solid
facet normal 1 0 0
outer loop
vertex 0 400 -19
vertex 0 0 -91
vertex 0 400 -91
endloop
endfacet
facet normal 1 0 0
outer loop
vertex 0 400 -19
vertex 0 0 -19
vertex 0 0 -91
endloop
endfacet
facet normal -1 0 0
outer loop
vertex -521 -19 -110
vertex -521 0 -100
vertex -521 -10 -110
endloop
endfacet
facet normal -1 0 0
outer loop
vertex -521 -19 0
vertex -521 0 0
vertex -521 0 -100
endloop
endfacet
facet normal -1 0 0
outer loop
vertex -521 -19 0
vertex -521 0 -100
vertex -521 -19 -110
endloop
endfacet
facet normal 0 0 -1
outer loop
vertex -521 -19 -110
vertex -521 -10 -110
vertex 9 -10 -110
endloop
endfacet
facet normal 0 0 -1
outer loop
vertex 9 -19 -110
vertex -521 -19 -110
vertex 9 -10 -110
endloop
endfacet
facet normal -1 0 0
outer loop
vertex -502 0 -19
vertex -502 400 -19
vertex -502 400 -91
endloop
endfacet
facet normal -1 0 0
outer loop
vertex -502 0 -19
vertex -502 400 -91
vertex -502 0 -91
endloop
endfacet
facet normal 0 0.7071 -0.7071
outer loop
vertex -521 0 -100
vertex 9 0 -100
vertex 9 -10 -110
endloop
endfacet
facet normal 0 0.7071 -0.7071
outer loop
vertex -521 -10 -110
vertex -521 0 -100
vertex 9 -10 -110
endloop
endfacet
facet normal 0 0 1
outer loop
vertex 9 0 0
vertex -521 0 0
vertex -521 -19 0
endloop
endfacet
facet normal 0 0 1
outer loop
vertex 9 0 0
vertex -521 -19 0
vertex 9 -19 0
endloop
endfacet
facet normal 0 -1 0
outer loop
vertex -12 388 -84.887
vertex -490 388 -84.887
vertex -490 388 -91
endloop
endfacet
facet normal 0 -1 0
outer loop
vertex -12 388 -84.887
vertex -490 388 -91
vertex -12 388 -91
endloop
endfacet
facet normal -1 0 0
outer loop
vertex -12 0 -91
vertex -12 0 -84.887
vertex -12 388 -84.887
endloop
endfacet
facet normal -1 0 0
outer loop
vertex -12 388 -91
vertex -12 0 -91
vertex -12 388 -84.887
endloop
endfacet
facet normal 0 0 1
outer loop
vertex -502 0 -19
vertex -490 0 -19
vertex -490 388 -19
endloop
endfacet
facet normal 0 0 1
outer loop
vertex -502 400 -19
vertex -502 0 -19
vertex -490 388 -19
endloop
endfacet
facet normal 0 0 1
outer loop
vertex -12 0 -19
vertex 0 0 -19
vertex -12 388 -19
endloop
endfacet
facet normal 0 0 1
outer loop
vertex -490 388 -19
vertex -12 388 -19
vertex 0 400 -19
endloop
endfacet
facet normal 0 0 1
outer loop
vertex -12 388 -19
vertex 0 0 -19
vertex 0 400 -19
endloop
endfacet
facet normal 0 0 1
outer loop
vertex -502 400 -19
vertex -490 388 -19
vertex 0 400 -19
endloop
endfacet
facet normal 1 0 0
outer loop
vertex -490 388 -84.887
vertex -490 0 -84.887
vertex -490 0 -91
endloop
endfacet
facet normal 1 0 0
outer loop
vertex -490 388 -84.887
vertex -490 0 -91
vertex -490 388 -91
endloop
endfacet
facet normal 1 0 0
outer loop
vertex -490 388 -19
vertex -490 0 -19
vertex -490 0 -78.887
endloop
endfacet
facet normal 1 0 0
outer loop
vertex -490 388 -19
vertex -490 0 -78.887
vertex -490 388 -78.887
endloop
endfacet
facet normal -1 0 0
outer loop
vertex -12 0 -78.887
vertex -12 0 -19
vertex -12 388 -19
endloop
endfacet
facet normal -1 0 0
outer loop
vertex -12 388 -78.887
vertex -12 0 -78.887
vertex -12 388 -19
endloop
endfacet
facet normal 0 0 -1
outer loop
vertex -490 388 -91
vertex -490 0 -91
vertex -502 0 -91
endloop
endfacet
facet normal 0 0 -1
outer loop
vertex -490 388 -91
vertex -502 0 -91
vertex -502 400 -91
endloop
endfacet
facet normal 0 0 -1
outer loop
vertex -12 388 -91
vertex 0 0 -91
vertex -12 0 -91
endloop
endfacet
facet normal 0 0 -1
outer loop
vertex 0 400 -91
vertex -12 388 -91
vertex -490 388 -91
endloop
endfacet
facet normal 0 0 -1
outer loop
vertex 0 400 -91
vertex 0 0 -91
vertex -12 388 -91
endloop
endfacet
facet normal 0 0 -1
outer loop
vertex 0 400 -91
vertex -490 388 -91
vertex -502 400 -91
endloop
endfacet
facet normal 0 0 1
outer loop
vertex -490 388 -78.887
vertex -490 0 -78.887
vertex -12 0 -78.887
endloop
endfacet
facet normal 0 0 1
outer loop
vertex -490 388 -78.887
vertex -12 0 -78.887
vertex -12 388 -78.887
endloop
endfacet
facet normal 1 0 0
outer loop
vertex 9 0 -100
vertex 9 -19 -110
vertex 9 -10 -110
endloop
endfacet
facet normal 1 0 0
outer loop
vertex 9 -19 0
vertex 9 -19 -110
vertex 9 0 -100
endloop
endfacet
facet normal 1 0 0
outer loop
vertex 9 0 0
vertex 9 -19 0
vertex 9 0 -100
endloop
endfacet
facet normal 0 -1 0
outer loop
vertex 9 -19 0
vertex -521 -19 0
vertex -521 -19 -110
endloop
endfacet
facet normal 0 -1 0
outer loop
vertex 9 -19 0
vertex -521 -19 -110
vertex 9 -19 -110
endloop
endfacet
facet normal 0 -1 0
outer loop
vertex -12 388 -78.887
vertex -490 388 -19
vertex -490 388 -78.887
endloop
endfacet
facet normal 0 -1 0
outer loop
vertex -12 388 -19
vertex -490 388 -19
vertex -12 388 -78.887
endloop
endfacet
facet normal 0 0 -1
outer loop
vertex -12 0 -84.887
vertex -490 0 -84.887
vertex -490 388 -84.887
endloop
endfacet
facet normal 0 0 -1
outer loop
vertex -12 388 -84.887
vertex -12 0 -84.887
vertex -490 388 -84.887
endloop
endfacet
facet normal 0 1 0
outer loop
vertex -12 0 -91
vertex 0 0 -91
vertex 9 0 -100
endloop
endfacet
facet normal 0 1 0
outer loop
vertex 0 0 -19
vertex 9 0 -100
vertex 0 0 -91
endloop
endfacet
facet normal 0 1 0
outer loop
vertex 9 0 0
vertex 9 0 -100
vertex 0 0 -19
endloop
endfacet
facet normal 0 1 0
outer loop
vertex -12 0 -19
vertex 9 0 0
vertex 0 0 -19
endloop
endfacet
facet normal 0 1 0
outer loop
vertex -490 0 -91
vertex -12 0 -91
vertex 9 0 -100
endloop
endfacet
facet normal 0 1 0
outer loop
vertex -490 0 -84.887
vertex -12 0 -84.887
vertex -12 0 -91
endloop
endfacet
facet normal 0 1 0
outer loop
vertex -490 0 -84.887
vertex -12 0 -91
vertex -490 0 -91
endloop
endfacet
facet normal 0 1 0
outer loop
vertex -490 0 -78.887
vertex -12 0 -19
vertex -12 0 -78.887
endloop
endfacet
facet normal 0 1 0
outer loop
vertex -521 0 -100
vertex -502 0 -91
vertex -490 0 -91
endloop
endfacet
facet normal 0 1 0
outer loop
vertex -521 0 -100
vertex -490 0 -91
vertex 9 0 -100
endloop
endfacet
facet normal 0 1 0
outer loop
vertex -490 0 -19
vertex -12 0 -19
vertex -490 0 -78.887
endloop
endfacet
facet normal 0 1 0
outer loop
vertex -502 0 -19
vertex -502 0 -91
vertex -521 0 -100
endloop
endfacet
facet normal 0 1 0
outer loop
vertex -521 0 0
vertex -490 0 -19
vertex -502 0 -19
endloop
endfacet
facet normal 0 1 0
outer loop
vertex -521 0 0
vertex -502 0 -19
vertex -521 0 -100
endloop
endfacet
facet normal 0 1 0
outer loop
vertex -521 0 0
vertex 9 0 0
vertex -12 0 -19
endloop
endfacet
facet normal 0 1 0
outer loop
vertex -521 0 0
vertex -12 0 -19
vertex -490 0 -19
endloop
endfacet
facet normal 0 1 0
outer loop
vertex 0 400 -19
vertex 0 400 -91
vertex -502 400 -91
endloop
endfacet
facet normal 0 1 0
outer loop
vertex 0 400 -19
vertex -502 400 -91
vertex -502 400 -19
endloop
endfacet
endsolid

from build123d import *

# Parameters (mm, degrees)
F0_W     = 478
F0_H     = 388
F1_DEPTH = 110
F2_W     = 400
F2_H     = 19
F3_DEPTH = 502
F4_W     = 400
F4_H     = 6
F5_DEPTH = 502
F7_DEPTH = 559


with BuildPart() as f1:
    # F0 (on Top) → F1 (new body)
    with BuildSketch(Plane.XY):
        Polygon((0, 0), (0, 400), (-502, 400), (-502, 0), (-521, 0), (-521, -19), (9, -19), (9, 0), align=None)
        with Locations((-251, 194)):
            Rectangle(F0_W, F0_H, mode=Mode.SUBTRACT)
    extrude(amount=-F1_DEPTH)

    # F2 (on Right) → F3 (cut)
    with BuildSketch(Plane.YZ):
        with Locations((200, -100.5)):
            Rectangle(F2_W, F2_H)
        with Locations((200, -9.5)):
            Rectangle(F2_W, F2_H)
    extrude(amount=-F3_DEPTH, mode=Mode.SUBTRACT)

    # F4 (on Right) → F5 (join)
    with BuildSketch(Plane.YZ):
        with Locations((200, -81.88692)):
            Rectangle(F4_W, F4_H)
    extrude(amount=-F5_DEPTH)

    # F6 (on Right) → F7 (cut, symmetric)
    with BuildSketch(Plane.YZ):
        Polygon((-10, -110), (0, -110), (0, -100), align=None)
    extrude(amount=F7_DEPTH, both=True, mode=Mode.SUBTRACT)


solid = f1.part
